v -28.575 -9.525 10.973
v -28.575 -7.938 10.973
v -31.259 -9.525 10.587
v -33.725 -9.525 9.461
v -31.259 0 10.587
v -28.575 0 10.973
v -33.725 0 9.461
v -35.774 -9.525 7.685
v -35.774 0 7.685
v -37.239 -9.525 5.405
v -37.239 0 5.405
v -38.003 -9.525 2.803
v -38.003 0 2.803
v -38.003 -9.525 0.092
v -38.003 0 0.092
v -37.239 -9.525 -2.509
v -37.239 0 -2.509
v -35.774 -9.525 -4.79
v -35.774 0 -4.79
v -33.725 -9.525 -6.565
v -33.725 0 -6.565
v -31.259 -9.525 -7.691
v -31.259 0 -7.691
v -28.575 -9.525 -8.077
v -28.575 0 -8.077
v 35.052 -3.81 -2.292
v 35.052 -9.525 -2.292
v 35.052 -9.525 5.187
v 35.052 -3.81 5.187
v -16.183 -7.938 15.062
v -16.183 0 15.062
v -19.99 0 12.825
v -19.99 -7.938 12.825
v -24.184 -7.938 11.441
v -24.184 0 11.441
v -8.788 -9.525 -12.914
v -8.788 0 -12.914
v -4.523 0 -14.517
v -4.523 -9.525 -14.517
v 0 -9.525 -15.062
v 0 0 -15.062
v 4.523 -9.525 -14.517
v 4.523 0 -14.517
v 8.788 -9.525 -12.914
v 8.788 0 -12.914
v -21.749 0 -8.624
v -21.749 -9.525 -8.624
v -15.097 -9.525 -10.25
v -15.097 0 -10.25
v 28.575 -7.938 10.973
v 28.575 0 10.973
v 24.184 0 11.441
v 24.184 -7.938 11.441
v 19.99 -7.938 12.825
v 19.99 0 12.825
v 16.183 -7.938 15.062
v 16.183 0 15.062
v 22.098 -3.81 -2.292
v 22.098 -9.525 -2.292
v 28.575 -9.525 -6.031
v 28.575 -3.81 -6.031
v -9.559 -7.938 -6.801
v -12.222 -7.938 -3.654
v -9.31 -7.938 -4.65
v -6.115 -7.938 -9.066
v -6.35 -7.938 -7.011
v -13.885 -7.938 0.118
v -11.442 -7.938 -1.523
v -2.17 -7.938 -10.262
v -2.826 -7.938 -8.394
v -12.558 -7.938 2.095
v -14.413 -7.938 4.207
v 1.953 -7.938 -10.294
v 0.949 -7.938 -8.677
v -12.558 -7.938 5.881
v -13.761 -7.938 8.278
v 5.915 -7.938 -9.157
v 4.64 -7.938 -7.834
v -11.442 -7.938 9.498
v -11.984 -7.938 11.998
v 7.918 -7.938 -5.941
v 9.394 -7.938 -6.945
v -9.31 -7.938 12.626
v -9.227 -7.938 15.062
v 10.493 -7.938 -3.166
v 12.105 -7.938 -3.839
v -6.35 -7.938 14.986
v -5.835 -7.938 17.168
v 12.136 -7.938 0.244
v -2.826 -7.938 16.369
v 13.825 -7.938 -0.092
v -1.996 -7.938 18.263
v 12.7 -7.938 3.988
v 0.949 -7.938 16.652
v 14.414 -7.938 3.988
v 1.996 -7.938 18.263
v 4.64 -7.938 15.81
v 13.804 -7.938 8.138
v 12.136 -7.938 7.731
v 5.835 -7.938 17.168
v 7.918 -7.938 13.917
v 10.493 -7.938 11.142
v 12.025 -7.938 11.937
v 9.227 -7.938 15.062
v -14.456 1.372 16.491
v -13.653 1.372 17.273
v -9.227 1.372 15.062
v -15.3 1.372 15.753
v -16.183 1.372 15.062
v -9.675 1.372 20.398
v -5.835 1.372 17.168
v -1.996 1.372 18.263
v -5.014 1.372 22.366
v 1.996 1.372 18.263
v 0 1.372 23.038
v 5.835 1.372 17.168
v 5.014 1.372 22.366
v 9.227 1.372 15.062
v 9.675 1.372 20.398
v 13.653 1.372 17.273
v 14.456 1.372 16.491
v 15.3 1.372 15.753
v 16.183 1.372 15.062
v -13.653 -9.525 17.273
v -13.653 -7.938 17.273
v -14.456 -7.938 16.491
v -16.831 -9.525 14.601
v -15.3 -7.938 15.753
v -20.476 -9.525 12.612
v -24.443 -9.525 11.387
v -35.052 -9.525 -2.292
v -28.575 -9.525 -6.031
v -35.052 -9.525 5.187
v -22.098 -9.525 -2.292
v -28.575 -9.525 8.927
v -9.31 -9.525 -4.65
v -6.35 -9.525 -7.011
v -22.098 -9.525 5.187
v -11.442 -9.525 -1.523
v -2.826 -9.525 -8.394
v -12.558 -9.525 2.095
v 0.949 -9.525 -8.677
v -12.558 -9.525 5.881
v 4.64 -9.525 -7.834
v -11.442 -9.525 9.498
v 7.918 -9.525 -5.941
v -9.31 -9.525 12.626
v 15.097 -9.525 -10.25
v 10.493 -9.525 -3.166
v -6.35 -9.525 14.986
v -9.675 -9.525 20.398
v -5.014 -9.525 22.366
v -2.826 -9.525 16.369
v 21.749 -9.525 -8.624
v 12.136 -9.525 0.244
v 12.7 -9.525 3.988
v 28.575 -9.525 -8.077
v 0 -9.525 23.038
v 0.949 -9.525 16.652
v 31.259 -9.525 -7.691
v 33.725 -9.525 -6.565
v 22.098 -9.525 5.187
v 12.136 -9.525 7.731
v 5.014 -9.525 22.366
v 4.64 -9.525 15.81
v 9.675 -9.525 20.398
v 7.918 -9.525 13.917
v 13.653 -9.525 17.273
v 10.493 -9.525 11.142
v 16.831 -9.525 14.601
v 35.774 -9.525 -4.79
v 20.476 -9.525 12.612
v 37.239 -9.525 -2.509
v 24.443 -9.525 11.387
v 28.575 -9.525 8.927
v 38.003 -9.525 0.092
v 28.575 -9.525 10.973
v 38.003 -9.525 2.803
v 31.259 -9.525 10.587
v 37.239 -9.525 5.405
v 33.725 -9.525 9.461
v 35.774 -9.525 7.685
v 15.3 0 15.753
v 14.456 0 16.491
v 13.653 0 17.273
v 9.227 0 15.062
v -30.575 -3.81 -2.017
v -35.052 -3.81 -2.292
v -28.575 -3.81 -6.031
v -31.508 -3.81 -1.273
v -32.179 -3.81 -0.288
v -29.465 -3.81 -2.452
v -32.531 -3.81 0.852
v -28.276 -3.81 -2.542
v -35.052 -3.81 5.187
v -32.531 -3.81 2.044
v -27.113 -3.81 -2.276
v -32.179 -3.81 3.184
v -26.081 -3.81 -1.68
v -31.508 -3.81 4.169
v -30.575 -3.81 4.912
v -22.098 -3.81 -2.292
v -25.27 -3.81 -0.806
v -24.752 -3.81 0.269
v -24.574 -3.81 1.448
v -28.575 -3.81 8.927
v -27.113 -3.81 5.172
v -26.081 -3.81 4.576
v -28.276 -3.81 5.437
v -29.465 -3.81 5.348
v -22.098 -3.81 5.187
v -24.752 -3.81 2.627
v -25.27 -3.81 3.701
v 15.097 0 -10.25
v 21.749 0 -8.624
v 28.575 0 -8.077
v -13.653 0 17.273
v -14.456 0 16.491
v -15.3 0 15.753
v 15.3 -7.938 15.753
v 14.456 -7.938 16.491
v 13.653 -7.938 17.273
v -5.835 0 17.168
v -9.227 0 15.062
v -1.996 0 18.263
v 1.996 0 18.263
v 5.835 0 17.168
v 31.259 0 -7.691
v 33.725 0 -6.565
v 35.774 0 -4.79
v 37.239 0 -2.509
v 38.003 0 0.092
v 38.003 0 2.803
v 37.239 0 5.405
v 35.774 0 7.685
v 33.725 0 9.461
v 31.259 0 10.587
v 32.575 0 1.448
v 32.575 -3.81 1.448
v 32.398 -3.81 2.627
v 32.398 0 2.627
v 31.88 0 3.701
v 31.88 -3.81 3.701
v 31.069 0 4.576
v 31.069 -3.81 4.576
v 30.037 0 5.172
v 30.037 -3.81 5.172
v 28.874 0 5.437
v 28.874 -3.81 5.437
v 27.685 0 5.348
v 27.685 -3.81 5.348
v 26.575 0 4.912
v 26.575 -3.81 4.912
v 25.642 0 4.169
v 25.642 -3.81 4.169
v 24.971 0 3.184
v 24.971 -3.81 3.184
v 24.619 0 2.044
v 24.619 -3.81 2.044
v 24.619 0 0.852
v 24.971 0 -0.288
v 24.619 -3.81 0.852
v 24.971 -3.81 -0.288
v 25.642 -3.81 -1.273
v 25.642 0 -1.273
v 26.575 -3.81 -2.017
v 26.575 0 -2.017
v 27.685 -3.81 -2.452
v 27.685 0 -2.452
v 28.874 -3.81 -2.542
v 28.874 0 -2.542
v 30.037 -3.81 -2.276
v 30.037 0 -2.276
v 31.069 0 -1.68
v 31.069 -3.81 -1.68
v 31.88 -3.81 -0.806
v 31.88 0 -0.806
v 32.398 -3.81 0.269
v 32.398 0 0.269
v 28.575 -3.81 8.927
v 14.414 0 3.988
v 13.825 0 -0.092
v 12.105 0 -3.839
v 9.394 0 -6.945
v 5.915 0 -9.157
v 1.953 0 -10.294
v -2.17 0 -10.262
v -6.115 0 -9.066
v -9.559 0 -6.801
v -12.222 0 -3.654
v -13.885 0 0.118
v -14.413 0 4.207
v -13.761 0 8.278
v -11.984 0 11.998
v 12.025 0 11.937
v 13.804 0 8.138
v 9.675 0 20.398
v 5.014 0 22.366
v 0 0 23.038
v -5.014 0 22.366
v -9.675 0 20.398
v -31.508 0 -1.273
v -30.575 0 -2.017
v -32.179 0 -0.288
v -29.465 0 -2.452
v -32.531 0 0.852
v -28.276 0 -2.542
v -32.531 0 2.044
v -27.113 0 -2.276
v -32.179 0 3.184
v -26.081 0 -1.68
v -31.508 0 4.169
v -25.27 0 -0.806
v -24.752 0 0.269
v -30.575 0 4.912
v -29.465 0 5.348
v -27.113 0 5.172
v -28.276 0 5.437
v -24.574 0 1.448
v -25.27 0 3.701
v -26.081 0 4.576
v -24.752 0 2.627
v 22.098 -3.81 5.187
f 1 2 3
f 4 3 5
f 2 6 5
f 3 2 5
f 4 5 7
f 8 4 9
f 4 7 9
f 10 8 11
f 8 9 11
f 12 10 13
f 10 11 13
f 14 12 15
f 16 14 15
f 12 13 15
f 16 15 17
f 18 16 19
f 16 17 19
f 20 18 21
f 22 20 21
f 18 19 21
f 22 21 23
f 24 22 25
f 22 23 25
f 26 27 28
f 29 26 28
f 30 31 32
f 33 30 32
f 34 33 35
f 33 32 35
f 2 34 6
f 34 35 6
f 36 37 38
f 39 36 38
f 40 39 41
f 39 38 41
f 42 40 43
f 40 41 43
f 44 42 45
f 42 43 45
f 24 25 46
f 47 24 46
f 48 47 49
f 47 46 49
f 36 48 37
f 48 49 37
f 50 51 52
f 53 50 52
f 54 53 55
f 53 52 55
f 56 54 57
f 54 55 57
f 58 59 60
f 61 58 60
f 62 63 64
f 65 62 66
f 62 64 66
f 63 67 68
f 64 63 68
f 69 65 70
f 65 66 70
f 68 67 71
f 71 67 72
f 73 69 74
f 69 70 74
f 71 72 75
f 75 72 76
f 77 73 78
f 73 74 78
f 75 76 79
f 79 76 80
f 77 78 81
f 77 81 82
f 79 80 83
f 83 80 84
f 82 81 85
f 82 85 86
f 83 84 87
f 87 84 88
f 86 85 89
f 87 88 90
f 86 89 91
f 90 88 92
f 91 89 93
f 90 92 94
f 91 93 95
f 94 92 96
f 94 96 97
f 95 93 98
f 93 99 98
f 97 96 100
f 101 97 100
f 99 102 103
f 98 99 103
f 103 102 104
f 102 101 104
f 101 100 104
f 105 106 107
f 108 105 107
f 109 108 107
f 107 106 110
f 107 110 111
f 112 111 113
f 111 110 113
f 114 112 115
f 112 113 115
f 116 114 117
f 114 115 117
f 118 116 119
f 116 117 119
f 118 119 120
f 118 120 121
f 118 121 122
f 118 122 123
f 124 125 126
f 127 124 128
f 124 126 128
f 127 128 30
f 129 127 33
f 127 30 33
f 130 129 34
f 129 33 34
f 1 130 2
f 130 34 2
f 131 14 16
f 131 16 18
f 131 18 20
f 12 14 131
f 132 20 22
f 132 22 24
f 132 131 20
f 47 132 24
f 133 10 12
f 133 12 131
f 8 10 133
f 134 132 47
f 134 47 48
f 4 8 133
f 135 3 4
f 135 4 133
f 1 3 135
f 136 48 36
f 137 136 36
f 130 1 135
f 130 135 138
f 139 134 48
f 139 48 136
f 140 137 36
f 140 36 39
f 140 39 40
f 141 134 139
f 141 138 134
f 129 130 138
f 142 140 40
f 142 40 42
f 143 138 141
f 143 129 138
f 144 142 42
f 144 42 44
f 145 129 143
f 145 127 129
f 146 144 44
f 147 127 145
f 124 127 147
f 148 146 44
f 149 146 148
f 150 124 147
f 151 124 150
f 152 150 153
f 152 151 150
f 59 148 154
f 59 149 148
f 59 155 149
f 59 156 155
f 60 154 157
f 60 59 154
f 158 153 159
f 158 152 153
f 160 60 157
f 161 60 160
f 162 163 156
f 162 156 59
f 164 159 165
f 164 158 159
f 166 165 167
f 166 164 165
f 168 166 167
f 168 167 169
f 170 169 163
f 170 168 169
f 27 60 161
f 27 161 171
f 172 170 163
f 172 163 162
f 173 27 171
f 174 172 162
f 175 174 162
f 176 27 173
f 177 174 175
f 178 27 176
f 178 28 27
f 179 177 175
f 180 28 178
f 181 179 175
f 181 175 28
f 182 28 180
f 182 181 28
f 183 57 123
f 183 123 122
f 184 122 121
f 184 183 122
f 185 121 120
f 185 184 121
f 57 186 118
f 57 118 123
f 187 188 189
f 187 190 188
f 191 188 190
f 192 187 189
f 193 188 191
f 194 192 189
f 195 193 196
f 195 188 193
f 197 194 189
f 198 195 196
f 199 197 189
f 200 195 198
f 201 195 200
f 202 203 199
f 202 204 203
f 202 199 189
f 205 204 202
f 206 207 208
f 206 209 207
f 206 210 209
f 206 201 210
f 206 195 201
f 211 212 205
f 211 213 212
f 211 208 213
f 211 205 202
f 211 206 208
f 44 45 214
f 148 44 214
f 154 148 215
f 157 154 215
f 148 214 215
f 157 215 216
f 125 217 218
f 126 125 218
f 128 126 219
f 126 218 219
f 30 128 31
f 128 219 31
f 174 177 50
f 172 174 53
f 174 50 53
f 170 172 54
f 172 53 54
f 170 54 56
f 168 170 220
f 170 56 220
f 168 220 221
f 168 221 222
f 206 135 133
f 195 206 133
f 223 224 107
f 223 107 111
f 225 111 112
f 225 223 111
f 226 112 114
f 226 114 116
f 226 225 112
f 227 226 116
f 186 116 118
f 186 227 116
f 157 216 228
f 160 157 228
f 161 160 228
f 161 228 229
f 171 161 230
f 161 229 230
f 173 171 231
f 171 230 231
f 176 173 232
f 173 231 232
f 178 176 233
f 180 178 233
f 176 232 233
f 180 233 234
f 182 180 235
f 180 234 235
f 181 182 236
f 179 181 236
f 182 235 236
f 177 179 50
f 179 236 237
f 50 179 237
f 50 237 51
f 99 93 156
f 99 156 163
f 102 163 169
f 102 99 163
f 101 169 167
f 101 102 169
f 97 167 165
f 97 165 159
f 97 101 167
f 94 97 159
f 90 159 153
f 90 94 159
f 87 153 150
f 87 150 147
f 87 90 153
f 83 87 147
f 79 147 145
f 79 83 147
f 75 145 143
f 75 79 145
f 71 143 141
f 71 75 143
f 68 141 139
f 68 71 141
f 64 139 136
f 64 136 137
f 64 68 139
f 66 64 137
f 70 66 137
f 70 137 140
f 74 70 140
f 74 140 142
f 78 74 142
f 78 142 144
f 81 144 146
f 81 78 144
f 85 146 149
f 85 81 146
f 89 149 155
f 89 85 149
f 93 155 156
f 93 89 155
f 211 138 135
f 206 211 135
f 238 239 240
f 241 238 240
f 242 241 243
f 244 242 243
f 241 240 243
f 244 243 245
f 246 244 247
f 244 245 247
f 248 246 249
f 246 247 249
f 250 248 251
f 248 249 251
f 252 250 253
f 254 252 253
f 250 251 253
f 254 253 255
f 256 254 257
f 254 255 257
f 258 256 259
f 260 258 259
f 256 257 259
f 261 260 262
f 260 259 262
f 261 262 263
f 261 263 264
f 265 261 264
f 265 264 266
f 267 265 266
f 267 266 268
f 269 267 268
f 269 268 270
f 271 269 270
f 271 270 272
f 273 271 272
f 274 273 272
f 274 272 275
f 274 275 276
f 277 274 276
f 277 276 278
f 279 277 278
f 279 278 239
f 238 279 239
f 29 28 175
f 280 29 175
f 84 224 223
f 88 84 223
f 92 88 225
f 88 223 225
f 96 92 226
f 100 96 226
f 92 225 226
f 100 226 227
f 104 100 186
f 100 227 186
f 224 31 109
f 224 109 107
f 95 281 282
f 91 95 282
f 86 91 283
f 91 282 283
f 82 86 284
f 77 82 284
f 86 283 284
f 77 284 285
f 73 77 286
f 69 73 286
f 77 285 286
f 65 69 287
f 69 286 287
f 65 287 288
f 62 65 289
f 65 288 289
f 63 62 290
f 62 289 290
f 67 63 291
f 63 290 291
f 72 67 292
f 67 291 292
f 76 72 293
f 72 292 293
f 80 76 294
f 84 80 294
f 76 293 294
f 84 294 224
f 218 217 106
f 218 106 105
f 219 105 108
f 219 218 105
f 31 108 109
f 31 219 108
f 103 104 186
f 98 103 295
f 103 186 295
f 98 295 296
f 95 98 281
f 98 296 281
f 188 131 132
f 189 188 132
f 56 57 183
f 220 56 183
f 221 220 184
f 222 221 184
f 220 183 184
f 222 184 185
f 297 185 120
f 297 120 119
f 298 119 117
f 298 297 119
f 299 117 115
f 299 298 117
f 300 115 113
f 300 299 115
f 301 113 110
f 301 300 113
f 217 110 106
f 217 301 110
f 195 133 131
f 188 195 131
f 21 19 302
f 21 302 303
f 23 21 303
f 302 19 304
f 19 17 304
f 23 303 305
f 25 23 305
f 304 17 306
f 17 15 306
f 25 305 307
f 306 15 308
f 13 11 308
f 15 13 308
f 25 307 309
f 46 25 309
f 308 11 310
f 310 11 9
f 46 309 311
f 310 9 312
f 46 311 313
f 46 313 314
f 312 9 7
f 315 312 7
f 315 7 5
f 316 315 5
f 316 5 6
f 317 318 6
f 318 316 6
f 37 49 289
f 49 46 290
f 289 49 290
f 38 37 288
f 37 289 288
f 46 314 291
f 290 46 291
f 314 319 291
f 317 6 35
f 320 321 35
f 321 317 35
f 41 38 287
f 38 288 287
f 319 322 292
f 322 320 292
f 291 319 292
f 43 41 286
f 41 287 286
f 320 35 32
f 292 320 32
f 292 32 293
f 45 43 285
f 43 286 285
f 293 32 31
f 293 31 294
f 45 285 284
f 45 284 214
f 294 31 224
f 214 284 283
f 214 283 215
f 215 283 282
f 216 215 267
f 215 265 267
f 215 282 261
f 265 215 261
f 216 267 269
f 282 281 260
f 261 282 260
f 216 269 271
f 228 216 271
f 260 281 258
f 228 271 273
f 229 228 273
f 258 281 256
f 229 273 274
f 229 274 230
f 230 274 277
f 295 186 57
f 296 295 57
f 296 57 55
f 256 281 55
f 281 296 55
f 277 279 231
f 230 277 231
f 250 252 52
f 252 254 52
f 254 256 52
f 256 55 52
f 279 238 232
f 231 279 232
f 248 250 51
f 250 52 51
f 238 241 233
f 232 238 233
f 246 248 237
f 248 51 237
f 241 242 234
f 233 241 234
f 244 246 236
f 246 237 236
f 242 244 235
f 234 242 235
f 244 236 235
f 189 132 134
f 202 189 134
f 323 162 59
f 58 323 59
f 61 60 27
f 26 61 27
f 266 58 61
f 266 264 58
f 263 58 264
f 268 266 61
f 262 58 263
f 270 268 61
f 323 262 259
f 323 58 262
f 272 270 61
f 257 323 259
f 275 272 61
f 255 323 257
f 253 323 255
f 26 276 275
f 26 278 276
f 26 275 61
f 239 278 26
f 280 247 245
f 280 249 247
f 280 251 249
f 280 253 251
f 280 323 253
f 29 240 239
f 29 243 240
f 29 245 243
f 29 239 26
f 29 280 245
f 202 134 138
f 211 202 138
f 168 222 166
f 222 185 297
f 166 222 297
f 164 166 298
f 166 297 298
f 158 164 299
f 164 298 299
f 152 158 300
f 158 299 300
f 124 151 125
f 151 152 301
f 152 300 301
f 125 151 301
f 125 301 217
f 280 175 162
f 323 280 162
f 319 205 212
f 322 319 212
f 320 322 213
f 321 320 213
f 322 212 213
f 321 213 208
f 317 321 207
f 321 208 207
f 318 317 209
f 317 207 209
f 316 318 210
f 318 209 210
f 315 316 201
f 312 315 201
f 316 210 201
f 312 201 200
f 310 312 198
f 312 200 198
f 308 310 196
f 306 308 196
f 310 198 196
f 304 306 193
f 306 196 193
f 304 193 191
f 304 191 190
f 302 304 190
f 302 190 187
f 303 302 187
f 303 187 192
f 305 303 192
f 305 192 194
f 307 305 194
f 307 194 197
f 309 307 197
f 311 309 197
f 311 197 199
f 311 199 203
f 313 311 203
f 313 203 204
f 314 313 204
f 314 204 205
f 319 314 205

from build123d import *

# Parameters (mm, degrees)
F2_DEPTH = 7.9375
F3_R     = 14.4145
F3_R_2   = 12.7
F4_DEPTH = 1.5875
F5_R     = 4.0005
F6_DEPTH = 5.715
F7_DEPTH = 9.526
F8_DEPTH = 1.3716


with BuildPart() as f2:
    # F1 (on Front) → F2 (new body)
    with BuildSketch(Plane.XZ):
        with BuildLine():
            ThreePointArc((-9.2268886896, 15.0622), (0, 18.4023), (9.2268886896, 15.0622))
            Line((9.2268886896, 15.0622), (16.1826561854, 15.0622))
            ThreePointArc((16.1826561854, 15.0622), (14.8730374451, 16.1166346988), (13.6527661358, 17.2732987427))
            ThreePointArc((13.6527661358, 17.2732987427), (0, 23.0378), (-13.6527661358, 17.2732987427))
            ThreePointArc((-13.6527661358, 17.2732987427), (-14.8730374451, 16.1166346988), (-16.1826561854, 15.0622))
            Line((-16.1826561854, 15.0622), (-9.2268886896, 15.0622))
        make_face()
        with BuildLine():
            ThreePointArc((9.2268886896, 15.0622), (13.0533290249, 10.1024064155), (14.4145, 3.9878))
            ThreePointArc((14.4145, 3.9878), (-6.1146064155, -9.0655290249), (-9.2268886896, 15.0622))
            Line((-9.2268886896, 15.0622), (-16.1826561854, 15.0622))
            ThreePointArc((-16.1826561854, 15.0622), (-22.0501747614, 12.0215629242), (-28.575, 10.9728))
            ThreePointArc((-28.575, 10.9728), (-38.1, 1.4478), (-28.575, -8.0772))
            ThreePointArc((-28.575, -8.0772), (-18.3903131498, -9.3039356127), (-8.7882106244, -12.9139707363))
            ThreePointArc((-8.7882106244, -12.9139707363), (0, -15.0622), (8.7882106244, -12.9139707363))
            ThreePointArc((8.7882106244, -12.9139707363), (18.3903131498, -9.3039356127), (28.575, -8.0772))
            ThreePointArc((28.575, -8.0772), (38.1, 1.4478), (28.575, 10.9728))
            ThreePointArc((28.575, 10.9728), (22.0501747614, 12.0215629242), (16.1826561854, 15.0622))
            Line((16.1826561854, 15.0622), (9.2268886896, 15.0622))
        make_face()
    extrude(amount=F2_DEPTH)

    # F3 (on face) → F4 (join)
    with BuildSketch(Plane.XZ.offset(7.9375)):
        with BuildLine():
            ThreePointArc((28.575, -8.0772), (38.1, 1.4478), (28.575, 10.9728))
            ThreePointArc((28.575, 10.9728), (20.4760903835, 12.6124877504), (13.6527661358, 17.2732987427))
            ThreePointArc((13.6527661358, 17.2732987427), (0, 23.0378), (-13.6527661358, 17.2732987427))
            ThreePointArc((-13.6527661358, 17.2732987427), (-20.4760903835, 12.6124877504), (-28.575, 10.9728))
            ThreePointArc((-28.575, 10.9728), (-38.1, 1.4478), (-28.575, -8.0772))
            ThreePointArc((-28.575, -8.0772), (-18.3903131498, -9.3039356127), (-8.7882106244, -12.9139707363))
            ThreePointArc((-8.7882106244, -12.9139707363), (0, -15.0622), (8.7882106244, -12.9139707363))
            ThreePointArc((8.7882106244, -12.9139707363), (18.3903131498, -9.3039356127), (28.575, -8.0772))
        make_face()
        with Locations((0, 3.9878)):
            Circle(F3_R, mode=Mode.SUBTRACT)
        with Locations((0, 3.9878)):
            Circle(F3_R)
        with Locations((0, 3.9878)):
            Circle(F3_R_2, mode=Mode.SUBTRACT)
    extrude(amount=F4_DEPTH)

    # F5 (on face) → F6 (cut)
    with BuildSketch(Plane.XZ.offset(9.525)):
        Polygon((-22.098, -2.2916976935), (-22.098, 5.1872976935), (-28.575, 8.9267953871), (-35.052, 5.1872976935), (-35.052, -2.2916976935), (-28.575, -6.0311953871), align=None)
        with Locations((-28.575, 1.4478)):
            Circle(F5_R, mode=Mode.SUBTRACT)
        Polygon((22.098, 5.1872976935), (22.098, -2.2916976935), (28.575, -6.0311953871), (35.052, -2.2916976935), (35.052, 5.1872976935), (28.575, 8.9267953871), align=None)
        with Locations((28.575, 1.4478)):
            Circle(F5_R, mode=Mode.SUBTRACT)
    extrude(amount=-F6_DEPTH, mode=Mode.SUBTRACT)

    # F7 (cut, through all): faces of the model
    f7_faces = [f2.faces().sort_by_distance(p)[0] for p in [
        (-28.575, -9.525, 1.4478),
        (28.575, -9.525, 1.4478),
    ]]
    extrude(f7_faces, amount=-F7_DEPTH, mode=Mode.SUBTRACT)

    # F1 (on Front) → F8 (join)
    with BuildSketch(Plane.XZ):
        with BuildLine():
            ThreePointArc((-9.2268886896, 15.0622), (0, 18.4023), (9.2268886896, 15.0622))
            Line((9.2268886896, 15.0622), (16.1826561854, 15.0622))
            ThreePointArc((16.1826561854, 15.0622), (14.8730374451, 16.1166346988), (13.6527661358, 17.2732987427))
            ThreePointArc((13.6527661358, 17.2732987427), (0, 23.0378), (-13.6527661358, 17.2732987427))
            ThreePointArc((-13.6527661358, 17.2732987427), (-14.8730374451, 16.1166346988), (-16.1826561854, 15.0622))
            Line((-16.1826561854, 15.0622), (-9.2268886896, 15.0622))
        make_face()
    extrude(amount=-F8_DEPTH)


solid = f2.part
